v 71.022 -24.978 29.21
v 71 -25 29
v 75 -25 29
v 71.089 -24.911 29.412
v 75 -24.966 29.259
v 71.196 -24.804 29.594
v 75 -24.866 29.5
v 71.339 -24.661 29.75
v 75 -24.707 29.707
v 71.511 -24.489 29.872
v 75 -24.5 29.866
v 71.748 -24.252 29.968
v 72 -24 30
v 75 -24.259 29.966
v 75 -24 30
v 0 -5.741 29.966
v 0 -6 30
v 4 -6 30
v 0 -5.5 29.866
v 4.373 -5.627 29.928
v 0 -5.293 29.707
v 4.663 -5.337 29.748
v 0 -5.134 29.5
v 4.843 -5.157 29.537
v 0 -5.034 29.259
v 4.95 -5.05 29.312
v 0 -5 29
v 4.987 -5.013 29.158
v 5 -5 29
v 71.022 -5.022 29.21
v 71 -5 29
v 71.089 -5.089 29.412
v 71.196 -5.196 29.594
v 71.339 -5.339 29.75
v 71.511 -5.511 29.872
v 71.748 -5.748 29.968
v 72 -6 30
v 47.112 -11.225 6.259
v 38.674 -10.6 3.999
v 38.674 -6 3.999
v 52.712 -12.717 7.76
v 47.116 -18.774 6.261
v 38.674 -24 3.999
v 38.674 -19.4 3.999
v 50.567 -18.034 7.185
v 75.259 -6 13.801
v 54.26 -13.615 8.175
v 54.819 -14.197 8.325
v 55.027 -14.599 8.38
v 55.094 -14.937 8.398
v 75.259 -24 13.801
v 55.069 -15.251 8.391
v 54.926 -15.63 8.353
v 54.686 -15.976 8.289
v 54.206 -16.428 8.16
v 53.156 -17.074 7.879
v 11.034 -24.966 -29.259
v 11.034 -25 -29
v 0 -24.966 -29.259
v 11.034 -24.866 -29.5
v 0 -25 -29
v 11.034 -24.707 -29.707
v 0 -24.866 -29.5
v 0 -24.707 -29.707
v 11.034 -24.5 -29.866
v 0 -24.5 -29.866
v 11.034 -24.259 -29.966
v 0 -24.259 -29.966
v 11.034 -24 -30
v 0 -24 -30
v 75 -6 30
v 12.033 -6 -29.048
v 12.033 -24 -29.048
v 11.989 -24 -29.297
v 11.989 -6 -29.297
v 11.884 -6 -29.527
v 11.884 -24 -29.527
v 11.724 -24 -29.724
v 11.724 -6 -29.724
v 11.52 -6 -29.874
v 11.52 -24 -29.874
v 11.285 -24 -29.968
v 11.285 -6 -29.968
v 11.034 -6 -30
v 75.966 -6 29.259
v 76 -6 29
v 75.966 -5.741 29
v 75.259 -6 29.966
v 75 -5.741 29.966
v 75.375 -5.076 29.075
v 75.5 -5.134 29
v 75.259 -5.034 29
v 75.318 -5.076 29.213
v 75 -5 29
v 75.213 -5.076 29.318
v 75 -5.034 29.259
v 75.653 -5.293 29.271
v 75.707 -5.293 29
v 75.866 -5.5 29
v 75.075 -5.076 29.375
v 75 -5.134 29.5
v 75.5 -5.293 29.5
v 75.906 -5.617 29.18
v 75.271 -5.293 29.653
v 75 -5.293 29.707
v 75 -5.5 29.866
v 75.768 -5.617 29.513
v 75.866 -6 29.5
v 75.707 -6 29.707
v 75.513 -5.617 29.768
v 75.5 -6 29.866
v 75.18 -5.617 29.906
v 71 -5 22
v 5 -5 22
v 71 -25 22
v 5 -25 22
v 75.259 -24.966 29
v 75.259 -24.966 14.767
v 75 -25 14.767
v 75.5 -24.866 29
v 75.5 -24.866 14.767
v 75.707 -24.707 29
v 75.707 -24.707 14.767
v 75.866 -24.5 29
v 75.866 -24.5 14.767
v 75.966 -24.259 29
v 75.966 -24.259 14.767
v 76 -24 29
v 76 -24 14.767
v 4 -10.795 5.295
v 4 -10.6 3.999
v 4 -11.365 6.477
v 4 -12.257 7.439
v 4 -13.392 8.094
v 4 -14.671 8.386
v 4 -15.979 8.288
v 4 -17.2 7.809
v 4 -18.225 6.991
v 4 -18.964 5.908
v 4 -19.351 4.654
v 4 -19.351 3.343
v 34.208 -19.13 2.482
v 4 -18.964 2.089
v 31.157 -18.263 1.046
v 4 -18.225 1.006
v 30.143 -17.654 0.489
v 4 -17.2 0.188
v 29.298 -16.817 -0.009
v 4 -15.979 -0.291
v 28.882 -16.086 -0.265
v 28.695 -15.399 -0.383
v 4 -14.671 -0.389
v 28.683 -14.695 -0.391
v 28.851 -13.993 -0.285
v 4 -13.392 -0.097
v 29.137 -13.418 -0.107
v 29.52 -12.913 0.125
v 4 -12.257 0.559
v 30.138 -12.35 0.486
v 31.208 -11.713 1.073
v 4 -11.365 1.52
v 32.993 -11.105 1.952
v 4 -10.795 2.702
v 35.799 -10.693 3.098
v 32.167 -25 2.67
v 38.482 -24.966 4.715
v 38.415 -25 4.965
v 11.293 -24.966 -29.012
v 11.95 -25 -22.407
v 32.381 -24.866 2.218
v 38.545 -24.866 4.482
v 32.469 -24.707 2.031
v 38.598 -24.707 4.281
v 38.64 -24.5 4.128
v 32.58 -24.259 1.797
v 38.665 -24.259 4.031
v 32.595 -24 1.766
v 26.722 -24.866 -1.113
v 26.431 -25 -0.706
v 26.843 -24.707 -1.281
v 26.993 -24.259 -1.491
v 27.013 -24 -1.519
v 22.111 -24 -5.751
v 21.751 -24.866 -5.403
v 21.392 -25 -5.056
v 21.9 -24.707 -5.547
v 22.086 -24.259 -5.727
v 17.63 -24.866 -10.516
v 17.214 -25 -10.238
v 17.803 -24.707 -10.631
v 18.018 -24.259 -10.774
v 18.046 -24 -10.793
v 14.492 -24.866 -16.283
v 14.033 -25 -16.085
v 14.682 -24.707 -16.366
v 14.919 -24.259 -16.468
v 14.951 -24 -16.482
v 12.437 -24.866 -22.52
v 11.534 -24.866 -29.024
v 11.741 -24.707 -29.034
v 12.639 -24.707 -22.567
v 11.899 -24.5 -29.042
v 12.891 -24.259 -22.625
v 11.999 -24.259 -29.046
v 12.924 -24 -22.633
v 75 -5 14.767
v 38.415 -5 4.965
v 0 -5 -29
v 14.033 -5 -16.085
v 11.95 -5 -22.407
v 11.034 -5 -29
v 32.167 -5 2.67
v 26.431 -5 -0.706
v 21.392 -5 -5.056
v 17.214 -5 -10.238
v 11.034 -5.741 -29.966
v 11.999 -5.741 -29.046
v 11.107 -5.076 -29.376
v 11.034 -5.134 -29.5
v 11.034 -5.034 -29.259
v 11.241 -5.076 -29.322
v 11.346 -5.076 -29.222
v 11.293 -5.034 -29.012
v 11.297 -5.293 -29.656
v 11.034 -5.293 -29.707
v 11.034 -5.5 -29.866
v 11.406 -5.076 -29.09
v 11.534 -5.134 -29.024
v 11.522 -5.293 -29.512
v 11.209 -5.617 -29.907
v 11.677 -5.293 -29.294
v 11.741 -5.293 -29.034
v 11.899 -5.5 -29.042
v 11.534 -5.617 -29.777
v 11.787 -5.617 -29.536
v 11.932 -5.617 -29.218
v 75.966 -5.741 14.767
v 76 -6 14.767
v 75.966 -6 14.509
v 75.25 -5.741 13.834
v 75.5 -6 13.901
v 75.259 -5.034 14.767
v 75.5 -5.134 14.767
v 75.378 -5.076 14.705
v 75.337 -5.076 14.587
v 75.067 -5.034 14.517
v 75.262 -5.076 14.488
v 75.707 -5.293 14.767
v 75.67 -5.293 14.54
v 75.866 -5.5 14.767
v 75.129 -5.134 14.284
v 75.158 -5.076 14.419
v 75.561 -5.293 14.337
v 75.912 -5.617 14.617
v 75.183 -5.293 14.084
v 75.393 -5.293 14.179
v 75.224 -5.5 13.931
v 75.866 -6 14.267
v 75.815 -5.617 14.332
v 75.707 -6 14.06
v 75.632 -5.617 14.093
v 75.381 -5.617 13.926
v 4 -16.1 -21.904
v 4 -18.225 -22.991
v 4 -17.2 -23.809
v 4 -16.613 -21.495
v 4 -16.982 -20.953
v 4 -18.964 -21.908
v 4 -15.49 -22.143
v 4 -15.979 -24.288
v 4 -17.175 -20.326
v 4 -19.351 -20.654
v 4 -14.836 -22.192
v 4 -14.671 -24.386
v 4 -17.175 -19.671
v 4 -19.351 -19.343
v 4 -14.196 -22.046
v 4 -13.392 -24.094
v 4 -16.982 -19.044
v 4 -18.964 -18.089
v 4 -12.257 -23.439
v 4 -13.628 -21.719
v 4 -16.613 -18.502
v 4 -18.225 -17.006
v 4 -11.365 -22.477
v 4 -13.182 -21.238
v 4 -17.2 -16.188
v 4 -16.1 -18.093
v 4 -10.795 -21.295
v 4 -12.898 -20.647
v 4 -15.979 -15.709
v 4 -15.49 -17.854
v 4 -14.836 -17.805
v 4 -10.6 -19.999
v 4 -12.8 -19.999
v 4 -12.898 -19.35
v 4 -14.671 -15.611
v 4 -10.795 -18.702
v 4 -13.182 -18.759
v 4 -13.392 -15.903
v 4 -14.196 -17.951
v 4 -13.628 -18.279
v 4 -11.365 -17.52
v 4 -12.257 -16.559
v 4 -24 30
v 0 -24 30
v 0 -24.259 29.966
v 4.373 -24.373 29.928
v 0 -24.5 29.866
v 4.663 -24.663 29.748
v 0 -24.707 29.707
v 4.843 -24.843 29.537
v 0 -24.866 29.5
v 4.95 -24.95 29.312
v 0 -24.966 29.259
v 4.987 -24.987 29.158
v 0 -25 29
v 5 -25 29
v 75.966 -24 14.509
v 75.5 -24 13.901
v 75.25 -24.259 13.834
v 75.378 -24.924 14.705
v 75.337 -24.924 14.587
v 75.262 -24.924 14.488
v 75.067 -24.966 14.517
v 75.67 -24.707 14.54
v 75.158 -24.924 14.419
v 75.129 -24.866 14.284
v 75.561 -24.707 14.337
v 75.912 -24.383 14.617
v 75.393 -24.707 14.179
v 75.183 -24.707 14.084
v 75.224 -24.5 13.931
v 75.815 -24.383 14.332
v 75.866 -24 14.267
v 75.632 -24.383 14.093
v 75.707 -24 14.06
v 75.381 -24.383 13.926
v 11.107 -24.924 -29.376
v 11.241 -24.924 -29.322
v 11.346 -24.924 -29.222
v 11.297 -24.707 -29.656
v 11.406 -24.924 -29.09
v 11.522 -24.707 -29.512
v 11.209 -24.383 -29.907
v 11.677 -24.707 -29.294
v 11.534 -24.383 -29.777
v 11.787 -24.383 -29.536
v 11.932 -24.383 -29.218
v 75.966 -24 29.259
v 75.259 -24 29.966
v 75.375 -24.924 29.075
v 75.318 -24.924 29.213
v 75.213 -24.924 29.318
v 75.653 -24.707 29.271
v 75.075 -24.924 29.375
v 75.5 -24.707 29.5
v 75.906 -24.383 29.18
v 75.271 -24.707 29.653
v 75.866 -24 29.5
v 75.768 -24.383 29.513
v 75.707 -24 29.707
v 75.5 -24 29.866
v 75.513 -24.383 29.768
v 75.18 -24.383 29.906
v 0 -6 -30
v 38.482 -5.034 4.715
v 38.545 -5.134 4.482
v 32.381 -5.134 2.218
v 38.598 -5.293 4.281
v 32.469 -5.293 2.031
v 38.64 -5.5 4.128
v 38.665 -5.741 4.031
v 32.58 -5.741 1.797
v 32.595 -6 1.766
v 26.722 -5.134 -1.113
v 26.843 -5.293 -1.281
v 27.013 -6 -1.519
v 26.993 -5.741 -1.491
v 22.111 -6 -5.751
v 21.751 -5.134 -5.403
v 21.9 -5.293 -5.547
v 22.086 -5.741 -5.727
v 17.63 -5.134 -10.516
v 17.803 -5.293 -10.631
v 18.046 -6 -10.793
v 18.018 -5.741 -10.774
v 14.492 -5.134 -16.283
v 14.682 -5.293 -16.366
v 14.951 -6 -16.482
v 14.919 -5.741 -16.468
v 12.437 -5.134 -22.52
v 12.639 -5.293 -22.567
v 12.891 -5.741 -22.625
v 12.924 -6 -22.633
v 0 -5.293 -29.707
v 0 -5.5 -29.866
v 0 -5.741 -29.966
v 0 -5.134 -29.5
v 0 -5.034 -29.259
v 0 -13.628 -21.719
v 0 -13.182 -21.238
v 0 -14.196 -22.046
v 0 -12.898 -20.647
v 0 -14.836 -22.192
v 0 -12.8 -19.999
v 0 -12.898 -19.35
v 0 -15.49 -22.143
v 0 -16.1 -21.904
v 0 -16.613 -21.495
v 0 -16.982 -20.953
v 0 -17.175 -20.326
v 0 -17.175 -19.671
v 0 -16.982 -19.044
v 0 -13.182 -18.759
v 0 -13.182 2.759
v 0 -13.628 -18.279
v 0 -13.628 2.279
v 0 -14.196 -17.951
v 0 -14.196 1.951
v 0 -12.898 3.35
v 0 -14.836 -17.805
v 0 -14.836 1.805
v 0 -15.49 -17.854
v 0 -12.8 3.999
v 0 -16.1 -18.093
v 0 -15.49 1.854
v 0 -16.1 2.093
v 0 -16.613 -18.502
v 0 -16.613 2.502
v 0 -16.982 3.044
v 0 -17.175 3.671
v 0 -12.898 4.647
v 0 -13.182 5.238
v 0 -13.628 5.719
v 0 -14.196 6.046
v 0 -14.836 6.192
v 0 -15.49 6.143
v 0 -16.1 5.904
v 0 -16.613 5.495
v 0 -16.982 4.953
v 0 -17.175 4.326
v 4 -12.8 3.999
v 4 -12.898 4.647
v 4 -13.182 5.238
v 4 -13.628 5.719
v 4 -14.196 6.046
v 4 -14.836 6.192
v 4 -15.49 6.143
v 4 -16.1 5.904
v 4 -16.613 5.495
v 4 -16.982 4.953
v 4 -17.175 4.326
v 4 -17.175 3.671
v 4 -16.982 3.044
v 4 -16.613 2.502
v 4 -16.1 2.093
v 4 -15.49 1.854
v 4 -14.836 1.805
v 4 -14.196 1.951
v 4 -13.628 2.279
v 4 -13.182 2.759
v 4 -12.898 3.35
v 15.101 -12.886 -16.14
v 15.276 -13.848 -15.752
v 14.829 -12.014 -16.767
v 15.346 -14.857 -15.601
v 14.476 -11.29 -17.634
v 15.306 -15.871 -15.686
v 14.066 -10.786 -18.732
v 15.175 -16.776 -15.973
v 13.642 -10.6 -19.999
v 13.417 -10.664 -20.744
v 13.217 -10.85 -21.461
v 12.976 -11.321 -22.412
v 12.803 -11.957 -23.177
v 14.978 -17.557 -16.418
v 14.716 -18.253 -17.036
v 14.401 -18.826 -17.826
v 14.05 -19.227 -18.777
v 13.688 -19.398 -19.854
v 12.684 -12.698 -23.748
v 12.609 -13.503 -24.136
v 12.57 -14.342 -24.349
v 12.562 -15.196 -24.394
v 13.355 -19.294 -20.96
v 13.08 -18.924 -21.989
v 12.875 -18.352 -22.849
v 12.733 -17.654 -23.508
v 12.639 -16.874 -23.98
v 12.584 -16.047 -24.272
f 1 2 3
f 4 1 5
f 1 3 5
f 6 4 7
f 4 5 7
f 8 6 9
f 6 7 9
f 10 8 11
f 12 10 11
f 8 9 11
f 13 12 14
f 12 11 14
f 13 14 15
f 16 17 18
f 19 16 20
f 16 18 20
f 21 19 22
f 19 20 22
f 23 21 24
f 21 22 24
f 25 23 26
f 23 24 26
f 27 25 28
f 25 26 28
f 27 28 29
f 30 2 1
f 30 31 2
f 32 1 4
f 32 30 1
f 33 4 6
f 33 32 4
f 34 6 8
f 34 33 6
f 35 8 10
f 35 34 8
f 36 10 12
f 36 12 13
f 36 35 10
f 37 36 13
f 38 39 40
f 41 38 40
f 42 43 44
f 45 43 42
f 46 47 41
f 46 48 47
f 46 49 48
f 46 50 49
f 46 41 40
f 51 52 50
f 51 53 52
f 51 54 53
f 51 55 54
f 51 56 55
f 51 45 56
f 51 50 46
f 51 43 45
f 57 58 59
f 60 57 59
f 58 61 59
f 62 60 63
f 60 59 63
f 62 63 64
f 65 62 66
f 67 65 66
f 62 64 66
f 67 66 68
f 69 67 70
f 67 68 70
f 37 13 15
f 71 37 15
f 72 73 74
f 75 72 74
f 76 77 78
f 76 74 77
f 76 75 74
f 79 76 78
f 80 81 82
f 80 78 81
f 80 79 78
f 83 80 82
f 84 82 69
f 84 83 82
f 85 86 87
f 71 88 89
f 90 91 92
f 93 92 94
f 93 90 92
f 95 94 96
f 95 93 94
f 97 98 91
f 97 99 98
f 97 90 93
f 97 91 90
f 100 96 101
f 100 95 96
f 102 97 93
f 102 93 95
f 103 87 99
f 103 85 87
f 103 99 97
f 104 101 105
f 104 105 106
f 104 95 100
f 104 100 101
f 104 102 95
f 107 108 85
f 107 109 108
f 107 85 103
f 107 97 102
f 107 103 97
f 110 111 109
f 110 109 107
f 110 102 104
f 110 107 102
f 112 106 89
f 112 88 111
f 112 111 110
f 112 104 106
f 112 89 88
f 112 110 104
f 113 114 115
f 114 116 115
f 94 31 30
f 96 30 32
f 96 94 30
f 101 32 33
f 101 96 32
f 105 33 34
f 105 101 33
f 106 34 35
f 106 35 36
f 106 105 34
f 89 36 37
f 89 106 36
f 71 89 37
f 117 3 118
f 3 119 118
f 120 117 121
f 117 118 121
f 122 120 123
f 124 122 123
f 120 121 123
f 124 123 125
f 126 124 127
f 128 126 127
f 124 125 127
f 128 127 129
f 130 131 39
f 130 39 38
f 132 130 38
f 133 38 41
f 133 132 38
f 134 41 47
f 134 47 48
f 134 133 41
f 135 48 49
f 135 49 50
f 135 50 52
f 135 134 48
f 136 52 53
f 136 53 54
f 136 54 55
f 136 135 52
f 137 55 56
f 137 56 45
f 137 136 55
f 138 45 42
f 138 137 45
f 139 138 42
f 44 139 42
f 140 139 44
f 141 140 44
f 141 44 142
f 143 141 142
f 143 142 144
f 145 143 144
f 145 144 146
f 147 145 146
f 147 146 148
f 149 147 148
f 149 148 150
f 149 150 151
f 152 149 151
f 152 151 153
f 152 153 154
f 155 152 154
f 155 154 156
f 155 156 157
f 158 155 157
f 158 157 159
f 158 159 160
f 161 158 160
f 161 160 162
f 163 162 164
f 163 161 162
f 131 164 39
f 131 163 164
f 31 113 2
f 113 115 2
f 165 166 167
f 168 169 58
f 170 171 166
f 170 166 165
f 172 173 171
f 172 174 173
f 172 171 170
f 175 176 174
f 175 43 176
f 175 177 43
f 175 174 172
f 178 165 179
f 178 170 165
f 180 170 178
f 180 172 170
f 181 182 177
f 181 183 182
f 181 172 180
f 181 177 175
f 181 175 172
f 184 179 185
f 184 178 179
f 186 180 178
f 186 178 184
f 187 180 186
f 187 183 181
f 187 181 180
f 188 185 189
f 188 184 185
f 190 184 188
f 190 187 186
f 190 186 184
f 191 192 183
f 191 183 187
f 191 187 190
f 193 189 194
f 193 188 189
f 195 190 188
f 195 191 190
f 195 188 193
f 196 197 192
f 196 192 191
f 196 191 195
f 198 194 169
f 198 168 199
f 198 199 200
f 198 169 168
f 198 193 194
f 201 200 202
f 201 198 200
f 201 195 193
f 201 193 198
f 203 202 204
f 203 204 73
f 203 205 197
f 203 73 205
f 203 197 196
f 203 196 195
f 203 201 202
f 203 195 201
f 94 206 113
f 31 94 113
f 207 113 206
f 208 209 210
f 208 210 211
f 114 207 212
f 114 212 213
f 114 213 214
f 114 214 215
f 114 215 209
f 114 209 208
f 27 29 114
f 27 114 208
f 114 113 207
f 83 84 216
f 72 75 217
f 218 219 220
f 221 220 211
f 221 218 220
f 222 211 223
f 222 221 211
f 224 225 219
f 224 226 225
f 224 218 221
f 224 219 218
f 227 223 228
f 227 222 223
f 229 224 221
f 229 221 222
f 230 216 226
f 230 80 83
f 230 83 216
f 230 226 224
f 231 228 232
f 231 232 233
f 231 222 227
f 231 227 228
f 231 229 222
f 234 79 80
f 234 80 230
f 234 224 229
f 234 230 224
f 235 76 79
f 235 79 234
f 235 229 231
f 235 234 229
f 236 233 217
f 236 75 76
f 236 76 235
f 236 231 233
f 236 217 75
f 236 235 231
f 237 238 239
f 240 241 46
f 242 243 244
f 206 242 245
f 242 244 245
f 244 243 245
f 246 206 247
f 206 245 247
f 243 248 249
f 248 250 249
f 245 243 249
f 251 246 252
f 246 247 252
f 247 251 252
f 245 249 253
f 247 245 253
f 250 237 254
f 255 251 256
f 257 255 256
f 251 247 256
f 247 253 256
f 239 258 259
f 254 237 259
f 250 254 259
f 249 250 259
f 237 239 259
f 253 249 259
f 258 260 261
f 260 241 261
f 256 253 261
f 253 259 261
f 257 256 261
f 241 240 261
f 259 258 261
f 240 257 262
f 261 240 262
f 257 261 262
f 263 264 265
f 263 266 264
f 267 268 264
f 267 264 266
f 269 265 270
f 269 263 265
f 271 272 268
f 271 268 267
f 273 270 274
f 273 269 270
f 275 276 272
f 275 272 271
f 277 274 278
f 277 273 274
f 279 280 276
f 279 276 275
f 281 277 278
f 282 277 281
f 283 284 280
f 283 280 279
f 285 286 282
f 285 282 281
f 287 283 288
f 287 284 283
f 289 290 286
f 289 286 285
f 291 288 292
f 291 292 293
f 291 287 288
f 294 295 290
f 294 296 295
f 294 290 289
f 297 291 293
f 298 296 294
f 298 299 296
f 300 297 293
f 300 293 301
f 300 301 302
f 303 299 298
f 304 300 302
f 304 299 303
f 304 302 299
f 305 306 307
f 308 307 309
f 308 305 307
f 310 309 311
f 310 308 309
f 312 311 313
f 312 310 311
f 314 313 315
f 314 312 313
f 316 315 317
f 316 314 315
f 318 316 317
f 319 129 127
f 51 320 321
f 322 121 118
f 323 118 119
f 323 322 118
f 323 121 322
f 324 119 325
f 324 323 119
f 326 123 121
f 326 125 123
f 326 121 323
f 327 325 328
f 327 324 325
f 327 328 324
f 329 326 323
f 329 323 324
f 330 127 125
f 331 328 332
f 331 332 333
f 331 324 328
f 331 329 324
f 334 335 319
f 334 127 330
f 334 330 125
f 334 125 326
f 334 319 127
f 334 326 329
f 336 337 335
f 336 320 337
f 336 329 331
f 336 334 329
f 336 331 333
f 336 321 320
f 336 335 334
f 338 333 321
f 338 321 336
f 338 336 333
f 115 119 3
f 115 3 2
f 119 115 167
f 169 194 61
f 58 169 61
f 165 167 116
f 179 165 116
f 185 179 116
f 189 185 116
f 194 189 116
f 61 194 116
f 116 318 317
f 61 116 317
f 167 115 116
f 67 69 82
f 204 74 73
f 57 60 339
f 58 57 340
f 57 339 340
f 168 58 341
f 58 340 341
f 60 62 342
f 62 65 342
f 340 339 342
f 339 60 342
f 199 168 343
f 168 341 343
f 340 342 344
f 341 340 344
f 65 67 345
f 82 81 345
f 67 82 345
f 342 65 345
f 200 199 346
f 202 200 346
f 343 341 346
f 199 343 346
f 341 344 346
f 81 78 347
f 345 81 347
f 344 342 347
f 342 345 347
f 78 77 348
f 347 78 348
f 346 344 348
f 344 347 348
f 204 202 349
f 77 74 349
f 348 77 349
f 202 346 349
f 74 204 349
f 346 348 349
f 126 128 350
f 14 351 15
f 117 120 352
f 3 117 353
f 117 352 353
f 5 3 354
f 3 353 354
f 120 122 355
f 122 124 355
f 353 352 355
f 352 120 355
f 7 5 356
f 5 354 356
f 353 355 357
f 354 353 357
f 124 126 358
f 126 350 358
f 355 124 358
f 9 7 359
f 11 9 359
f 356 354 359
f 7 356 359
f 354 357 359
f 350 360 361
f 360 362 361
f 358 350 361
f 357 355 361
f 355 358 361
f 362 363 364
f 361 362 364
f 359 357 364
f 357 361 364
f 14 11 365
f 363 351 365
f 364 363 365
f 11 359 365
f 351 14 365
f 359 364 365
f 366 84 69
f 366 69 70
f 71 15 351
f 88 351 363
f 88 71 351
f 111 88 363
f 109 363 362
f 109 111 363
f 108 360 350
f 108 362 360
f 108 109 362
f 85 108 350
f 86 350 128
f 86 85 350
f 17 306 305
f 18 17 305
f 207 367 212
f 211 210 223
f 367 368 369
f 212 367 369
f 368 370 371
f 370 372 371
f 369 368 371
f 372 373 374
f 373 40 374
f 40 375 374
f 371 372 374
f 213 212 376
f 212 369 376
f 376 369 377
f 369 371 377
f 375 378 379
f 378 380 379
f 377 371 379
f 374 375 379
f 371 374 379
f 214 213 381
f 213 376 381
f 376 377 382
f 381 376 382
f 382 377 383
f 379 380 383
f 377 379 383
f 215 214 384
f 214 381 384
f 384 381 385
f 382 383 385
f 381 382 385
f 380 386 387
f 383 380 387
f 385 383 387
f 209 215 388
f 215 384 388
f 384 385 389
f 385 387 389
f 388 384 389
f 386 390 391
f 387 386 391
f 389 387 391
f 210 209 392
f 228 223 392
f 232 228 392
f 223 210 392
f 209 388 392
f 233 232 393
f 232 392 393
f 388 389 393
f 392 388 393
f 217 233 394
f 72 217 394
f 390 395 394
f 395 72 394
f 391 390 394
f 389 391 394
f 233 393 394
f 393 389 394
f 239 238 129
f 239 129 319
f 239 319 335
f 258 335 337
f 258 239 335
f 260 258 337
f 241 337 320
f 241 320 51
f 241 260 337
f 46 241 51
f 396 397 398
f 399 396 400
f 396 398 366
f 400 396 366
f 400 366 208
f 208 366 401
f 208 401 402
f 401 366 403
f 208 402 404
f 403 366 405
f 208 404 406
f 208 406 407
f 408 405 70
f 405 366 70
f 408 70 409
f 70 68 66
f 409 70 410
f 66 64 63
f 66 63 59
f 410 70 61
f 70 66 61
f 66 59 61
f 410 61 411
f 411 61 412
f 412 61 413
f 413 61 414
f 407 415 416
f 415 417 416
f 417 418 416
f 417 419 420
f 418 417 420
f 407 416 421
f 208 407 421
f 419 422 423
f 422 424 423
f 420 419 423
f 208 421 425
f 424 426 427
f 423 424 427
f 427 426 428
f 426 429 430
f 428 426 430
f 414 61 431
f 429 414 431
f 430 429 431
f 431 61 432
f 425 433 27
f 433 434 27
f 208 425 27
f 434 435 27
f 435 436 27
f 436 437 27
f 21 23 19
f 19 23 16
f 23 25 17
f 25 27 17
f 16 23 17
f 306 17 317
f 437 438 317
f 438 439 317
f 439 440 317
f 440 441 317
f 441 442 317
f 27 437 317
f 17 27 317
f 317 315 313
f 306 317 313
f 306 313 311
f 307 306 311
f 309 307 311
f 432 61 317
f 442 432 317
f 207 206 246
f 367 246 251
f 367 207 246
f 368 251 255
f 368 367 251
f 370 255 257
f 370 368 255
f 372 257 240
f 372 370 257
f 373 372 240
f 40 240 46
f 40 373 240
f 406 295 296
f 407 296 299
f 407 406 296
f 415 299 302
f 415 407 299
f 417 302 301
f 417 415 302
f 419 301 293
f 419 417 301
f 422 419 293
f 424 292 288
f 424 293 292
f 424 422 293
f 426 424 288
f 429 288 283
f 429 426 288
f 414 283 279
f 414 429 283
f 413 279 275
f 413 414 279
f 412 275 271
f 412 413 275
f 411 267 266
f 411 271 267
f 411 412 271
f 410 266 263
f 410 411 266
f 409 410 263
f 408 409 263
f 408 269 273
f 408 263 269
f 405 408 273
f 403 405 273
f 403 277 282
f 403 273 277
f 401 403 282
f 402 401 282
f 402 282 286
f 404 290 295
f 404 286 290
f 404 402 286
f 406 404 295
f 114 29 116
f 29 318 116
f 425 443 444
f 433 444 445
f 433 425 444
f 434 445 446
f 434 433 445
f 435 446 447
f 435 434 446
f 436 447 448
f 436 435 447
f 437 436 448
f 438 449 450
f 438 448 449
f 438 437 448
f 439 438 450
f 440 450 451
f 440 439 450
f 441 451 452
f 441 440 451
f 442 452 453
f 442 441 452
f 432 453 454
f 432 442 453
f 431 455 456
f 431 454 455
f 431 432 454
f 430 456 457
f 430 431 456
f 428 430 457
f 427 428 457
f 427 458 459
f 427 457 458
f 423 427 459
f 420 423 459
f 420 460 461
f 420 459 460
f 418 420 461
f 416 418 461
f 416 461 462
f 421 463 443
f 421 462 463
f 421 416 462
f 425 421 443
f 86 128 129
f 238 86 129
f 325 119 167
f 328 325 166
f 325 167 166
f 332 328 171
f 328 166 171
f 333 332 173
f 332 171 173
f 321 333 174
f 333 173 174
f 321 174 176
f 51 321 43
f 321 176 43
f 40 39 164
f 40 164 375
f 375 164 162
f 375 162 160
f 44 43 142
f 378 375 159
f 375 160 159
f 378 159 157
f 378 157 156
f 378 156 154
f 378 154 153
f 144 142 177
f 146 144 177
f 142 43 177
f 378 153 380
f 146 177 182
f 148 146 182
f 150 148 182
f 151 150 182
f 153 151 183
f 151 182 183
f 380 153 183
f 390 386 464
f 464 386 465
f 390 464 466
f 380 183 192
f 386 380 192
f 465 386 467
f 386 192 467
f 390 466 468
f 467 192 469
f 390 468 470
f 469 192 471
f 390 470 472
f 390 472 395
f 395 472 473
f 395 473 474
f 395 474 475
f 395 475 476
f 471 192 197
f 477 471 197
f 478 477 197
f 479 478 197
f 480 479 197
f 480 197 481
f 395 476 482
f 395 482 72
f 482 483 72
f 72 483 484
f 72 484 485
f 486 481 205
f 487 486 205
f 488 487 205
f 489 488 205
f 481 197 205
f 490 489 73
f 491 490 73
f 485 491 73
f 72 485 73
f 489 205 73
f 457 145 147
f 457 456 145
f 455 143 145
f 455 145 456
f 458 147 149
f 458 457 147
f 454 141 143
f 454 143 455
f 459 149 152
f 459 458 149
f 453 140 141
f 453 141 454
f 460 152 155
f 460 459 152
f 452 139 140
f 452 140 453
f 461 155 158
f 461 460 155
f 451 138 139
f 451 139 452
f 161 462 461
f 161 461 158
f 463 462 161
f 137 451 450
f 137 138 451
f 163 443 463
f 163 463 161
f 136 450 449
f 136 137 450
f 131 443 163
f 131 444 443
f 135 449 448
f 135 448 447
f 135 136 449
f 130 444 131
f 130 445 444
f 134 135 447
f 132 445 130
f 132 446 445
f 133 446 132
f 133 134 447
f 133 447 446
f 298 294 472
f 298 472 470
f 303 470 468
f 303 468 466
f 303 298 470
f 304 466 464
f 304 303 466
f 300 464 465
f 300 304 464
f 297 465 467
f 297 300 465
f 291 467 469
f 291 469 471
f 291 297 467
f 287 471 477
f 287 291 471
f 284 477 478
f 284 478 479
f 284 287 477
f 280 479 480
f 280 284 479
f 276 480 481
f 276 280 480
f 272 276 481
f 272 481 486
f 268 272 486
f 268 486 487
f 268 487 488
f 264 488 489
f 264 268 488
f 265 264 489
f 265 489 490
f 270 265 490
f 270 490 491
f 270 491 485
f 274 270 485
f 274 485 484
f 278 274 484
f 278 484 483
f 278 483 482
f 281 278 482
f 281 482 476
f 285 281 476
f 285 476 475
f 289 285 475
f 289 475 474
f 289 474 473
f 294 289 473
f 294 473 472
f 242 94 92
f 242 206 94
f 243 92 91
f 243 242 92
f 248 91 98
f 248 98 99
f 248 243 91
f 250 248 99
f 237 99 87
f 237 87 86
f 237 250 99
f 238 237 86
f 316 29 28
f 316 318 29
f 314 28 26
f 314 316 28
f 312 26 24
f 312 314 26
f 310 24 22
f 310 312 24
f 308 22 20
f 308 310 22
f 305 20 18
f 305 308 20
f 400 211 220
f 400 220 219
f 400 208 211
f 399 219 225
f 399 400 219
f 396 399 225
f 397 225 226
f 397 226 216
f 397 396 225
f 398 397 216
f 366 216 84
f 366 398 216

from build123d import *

# Parameters (mm, degrees)
PAD_DEPTH       = 10
SKETCH001_R     = 2.2
POCKET_DEPTH    = 76.001
SKETCH002_R     = 4.4
POCKET001_DEPTH = 72.001
FILLET_R        = 1


with BuildPart() as part:
    # Sketch → Pad (new body, symmetric)
    with BuildSketch(Plane.XZ):
        with BuildLine():
            Line((5, 30), (5, 22))
            Line((5, 22), (71, 22))
            Line((71, 22), (71, 30))
            Line((71, 30), (76, 30))
            Line((76, 30), (76, 14))
            Line((38.674177, 3.998576), (76, 14))
            ThreePointArc((38.674177, 3.998576), (19.66843, -8.553267), (12, -30))
            Line((12, -30), (0, -30))
            Line((0, -30), (0, 30))
            Line((0, 30), (5, 30))
        make_face()
    extrude(amount=PAD_DEPTH, both=True)

    # Sketch001 → Pocket (cut, through all)
    with BuildSketch(Plane.YZ):
        with Locations((0, 3.998576)):
            Circle(SKETCH001_R)
        with Locations((0, -19.998576)):
            Circle(SKETCH001_R)
    extrude(amount=POCKET_DEPTH, mode=Mode.SUBTRACT)

    # Sketch002 → Pocket001 (cut, through all)
    with BuildSketch(Plane.YZ.offset(4)):
        with Locations((0, 3.998576)):
            Circle(SKETCH002_R)
        with Locations((0, -19.998576)):
            Circle(SKETCH002_R)
    extrude(amount=POCKET001_DEPTH, mode=Mode.SUBTRACT)

    # Fillet
    fillet_edges = [part.edges().sort_by_distance(p)[0] for p in [
        (76, 0, 30),
        (76, 0, 14),
        (76, 10, 22),
        (76, -10, 22),
        (73.5, -10, 30),
        (73.5, 10, 30),
        (19.66843, -10, -8.553267),
        (19.66843, 10, -8.553267),
        (12, 0, -30),
        (6, -10, -30),
        (6, 10, -30),
        (2.5, 10, 30),
        (2.5, -10, 30),
        (5, 0, 30),
        (71, 0, 30),
    ]]
    fillet(fillet_edges, radius=FILLET_R)


with BuildPart() as part_1:
    # Body placement: moved
    add(part.part.moved(Location((0, -15, 0))))


solid = part_1.part
